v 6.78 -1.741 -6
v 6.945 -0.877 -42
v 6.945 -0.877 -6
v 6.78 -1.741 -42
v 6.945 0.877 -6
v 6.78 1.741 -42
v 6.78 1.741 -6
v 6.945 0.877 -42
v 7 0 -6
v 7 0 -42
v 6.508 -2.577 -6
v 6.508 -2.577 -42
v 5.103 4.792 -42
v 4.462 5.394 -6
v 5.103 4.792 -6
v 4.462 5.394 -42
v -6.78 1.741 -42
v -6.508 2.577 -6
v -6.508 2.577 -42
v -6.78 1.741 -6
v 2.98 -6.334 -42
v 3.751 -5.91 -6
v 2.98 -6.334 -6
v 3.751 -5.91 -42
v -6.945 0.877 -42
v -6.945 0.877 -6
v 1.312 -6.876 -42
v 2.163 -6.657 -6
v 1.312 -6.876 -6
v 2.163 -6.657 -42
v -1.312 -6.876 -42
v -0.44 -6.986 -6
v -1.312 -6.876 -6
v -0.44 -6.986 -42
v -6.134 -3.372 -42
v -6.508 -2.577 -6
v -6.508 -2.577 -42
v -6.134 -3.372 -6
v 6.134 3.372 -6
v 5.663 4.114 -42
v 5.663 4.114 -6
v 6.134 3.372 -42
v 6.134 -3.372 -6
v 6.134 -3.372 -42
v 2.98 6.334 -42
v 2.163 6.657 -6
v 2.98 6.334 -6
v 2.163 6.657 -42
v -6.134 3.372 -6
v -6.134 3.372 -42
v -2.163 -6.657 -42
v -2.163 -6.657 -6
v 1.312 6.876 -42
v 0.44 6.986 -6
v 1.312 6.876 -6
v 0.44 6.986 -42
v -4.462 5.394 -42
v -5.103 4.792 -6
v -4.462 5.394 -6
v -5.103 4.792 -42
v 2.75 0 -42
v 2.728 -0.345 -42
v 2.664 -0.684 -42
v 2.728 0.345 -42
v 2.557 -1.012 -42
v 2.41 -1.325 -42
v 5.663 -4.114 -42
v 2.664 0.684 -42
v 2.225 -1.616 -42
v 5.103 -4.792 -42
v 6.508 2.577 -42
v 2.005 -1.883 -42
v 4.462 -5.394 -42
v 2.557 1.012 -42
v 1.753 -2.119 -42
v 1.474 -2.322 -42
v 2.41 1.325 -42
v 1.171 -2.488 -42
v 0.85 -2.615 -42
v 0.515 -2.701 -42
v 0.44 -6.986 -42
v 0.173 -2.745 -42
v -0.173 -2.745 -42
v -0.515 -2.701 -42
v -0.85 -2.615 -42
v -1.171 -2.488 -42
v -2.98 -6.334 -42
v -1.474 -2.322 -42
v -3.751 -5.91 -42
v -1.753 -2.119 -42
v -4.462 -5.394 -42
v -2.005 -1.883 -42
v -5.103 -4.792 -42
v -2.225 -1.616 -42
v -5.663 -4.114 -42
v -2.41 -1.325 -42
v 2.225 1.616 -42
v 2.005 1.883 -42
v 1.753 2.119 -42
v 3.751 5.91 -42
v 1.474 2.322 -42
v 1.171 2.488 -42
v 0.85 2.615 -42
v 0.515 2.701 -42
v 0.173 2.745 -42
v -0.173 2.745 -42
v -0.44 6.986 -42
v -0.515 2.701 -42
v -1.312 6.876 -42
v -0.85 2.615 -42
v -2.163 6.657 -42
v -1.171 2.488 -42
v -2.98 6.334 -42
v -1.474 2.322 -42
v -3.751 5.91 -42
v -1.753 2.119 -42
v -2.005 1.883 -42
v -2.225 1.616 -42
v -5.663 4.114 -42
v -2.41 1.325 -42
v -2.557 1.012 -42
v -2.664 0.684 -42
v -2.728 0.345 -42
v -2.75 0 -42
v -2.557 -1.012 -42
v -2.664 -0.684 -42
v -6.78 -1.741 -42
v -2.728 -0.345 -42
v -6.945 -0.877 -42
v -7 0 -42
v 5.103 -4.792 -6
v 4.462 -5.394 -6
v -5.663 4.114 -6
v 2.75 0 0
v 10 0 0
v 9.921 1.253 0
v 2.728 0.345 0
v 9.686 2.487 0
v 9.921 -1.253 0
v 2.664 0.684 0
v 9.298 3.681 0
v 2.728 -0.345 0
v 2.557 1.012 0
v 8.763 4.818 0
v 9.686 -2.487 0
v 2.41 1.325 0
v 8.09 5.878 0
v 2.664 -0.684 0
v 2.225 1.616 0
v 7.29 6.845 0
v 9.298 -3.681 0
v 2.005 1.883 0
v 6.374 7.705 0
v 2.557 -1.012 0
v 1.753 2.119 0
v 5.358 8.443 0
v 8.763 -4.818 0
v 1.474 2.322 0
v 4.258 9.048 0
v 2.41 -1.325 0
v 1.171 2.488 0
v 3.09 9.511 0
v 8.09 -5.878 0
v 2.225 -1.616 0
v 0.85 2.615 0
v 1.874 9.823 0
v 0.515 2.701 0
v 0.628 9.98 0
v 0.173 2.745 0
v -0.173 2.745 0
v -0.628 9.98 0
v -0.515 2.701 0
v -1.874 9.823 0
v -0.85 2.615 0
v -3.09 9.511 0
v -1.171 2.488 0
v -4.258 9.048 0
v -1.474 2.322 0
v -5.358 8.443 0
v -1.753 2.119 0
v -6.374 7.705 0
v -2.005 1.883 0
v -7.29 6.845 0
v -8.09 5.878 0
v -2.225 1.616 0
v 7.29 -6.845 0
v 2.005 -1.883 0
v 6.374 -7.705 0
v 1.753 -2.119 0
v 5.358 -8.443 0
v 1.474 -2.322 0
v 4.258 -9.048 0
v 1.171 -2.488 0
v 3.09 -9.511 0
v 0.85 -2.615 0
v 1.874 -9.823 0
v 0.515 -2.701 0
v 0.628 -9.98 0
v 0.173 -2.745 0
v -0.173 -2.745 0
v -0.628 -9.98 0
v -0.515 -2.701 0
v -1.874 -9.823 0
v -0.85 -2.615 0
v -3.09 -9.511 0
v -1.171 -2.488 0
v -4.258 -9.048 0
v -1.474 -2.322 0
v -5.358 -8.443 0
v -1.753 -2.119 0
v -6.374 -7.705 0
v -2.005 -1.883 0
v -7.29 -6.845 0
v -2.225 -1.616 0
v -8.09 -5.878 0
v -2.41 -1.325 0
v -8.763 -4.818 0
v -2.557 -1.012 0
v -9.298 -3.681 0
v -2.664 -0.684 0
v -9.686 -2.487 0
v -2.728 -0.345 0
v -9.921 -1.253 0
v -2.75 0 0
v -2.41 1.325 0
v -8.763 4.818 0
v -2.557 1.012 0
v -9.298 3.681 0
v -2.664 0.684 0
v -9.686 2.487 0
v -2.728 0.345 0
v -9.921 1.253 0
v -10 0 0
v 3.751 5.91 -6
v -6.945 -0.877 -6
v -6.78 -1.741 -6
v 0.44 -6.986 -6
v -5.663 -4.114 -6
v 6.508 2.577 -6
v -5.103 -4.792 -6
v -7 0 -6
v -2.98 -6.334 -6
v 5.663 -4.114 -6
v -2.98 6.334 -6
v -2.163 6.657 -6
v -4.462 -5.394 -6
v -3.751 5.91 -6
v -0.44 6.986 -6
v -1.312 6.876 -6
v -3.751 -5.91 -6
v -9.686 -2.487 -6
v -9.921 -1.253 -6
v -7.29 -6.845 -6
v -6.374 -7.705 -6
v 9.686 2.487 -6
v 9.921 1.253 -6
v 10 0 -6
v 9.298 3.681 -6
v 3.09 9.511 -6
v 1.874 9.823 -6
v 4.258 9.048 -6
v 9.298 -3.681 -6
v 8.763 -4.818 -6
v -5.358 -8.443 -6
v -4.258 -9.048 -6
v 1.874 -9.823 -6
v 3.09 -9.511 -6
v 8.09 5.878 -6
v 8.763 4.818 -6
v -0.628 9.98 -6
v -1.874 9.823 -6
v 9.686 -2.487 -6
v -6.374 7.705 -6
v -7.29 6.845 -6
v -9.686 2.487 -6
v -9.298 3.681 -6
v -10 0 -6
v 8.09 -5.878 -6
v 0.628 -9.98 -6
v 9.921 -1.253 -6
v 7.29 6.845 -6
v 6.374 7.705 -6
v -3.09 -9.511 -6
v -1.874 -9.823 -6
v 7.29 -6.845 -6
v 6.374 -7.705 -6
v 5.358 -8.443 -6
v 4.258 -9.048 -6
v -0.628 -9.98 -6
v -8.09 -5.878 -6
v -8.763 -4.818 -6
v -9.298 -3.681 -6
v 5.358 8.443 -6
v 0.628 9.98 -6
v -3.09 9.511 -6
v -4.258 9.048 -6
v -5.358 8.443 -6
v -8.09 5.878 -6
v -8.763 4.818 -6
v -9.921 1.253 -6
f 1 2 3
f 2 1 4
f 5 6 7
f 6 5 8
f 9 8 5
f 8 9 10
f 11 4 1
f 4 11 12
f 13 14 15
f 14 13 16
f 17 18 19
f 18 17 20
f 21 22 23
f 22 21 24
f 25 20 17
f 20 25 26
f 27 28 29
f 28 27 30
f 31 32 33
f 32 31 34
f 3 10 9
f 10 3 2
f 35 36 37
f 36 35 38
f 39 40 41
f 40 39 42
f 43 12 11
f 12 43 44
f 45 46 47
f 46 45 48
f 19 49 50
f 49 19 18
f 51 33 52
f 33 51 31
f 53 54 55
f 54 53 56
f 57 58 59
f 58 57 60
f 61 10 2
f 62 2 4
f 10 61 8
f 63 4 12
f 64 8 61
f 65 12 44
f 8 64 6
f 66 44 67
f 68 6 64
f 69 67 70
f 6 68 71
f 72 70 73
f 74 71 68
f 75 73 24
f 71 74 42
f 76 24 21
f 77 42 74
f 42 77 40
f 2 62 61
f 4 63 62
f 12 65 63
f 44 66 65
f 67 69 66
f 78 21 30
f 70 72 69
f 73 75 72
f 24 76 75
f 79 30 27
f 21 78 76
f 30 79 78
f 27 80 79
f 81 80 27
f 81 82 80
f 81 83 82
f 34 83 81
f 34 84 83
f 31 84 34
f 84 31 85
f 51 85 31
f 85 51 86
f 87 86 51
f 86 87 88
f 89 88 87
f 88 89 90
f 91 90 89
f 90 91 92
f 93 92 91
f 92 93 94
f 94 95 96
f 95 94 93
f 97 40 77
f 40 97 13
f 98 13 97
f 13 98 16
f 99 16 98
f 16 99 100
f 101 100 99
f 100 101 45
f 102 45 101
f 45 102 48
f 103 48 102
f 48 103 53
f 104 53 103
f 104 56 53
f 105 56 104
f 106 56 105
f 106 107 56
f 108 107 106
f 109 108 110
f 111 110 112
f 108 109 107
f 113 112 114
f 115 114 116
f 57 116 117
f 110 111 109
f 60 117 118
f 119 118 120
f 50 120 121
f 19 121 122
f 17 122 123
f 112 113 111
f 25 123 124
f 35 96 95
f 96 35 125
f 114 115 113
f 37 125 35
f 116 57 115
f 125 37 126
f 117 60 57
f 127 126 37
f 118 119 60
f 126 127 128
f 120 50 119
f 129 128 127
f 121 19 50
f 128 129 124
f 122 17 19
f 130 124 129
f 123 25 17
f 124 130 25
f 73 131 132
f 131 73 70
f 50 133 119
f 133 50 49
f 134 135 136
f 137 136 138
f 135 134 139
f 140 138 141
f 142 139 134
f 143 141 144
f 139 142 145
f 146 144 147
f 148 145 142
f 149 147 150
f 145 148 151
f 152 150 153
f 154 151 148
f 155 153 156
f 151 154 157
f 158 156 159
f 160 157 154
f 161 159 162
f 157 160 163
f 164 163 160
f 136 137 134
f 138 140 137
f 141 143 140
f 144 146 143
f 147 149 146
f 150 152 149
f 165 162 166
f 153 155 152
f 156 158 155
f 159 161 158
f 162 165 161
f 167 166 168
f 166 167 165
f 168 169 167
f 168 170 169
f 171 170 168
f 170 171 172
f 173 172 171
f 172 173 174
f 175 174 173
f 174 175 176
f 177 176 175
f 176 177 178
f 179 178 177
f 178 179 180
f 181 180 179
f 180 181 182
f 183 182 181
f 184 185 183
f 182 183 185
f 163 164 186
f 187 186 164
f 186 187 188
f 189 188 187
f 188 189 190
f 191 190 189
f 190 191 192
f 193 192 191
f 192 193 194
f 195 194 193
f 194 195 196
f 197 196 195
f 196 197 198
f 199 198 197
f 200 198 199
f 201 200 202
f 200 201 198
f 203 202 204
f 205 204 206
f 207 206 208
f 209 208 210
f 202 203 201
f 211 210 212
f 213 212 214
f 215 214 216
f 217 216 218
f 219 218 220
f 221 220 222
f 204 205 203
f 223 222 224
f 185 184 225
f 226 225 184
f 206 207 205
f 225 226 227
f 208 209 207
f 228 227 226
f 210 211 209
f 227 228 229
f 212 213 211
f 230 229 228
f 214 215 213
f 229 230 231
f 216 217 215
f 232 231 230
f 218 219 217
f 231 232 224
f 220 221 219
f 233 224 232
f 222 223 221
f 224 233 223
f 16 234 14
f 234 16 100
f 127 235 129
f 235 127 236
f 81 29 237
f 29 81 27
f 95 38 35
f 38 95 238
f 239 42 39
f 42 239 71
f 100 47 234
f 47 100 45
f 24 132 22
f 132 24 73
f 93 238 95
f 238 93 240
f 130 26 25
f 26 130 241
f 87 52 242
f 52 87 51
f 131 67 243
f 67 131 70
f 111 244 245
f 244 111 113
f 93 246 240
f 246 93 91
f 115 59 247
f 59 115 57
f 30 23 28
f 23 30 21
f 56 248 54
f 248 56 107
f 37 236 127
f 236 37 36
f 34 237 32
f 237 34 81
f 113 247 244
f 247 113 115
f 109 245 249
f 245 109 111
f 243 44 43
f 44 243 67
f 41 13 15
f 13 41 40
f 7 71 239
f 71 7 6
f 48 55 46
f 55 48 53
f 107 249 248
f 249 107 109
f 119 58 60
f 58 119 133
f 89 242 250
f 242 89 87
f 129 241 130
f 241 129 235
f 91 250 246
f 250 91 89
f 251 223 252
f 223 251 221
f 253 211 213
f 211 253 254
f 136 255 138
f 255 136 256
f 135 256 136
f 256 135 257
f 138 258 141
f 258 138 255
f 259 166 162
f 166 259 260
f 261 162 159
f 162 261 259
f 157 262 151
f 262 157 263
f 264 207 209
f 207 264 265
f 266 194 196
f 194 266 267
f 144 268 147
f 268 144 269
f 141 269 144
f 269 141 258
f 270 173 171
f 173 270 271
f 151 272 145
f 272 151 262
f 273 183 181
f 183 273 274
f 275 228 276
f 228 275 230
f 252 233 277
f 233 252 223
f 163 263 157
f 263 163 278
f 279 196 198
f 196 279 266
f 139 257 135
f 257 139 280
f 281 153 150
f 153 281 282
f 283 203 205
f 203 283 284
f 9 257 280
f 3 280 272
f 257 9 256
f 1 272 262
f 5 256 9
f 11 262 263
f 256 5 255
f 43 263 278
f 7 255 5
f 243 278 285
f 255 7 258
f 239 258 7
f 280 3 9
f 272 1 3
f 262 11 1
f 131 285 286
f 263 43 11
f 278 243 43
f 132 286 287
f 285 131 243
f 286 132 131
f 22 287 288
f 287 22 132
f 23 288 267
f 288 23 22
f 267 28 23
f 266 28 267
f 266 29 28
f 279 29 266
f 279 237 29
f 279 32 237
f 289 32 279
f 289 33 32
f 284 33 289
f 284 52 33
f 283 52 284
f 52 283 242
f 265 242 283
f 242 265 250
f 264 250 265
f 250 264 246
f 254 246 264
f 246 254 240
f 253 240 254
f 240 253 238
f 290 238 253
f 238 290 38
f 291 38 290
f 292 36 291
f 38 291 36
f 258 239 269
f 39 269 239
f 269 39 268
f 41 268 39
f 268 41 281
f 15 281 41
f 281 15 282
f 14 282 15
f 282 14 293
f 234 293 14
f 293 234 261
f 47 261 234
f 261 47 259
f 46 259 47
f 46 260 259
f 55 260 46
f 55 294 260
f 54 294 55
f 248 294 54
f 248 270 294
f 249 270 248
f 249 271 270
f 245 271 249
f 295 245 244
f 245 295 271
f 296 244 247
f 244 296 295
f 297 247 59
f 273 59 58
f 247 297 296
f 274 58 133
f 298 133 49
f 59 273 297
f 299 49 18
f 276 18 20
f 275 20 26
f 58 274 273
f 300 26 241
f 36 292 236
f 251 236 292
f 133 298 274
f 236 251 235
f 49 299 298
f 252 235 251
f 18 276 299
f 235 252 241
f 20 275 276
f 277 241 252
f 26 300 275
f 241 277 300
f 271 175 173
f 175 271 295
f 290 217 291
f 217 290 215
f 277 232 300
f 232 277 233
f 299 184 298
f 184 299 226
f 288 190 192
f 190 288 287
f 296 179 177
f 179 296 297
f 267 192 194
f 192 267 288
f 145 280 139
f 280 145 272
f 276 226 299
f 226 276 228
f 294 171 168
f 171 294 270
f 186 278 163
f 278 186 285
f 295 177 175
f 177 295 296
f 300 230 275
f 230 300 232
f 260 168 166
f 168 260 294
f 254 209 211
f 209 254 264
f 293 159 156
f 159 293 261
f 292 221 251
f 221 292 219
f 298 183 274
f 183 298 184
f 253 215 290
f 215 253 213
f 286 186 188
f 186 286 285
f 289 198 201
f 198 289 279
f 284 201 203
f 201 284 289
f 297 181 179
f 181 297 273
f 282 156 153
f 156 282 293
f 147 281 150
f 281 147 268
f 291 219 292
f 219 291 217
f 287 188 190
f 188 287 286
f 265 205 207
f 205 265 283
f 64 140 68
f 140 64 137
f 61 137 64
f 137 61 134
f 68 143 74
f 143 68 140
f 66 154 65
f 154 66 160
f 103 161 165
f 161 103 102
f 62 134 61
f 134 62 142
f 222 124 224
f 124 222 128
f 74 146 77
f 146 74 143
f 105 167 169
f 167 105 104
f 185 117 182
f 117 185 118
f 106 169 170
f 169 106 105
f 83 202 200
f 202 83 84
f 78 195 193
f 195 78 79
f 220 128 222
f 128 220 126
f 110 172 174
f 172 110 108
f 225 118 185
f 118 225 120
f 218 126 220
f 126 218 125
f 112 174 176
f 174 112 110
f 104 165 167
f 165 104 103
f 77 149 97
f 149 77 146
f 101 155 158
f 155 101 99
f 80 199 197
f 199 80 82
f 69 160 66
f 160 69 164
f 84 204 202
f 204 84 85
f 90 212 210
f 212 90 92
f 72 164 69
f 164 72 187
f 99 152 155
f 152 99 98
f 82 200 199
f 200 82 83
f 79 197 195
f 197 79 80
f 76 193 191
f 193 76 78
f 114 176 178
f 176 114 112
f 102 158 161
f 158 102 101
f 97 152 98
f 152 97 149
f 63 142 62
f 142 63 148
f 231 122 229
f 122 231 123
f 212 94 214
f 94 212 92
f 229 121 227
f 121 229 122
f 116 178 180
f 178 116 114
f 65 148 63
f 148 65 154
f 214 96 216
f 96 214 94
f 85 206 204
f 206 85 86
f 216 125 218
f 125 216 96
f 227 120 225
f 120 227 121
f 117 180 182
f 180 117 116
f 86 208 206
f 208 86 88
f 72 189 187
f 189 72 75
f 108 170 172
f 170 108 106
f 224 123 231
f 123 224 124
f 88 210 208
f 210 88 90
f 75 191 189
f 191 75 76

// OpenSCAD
$fn = 50;


difference() {
	union() {
		translate(v = [0, 0, -42.0000000000]) {
			cylinder(h = 42, r = 7.0000000000);
		}
		translate(v = [0, 0, -6.0000000000]) {
			cylinder(h = 6, r = 10.0000000000);
		}
	}
	union() {
		#translate(v = [0, 0, -42]) {
			cylinder(h = 42, r = 2.7500000000);
		}
	}
}
